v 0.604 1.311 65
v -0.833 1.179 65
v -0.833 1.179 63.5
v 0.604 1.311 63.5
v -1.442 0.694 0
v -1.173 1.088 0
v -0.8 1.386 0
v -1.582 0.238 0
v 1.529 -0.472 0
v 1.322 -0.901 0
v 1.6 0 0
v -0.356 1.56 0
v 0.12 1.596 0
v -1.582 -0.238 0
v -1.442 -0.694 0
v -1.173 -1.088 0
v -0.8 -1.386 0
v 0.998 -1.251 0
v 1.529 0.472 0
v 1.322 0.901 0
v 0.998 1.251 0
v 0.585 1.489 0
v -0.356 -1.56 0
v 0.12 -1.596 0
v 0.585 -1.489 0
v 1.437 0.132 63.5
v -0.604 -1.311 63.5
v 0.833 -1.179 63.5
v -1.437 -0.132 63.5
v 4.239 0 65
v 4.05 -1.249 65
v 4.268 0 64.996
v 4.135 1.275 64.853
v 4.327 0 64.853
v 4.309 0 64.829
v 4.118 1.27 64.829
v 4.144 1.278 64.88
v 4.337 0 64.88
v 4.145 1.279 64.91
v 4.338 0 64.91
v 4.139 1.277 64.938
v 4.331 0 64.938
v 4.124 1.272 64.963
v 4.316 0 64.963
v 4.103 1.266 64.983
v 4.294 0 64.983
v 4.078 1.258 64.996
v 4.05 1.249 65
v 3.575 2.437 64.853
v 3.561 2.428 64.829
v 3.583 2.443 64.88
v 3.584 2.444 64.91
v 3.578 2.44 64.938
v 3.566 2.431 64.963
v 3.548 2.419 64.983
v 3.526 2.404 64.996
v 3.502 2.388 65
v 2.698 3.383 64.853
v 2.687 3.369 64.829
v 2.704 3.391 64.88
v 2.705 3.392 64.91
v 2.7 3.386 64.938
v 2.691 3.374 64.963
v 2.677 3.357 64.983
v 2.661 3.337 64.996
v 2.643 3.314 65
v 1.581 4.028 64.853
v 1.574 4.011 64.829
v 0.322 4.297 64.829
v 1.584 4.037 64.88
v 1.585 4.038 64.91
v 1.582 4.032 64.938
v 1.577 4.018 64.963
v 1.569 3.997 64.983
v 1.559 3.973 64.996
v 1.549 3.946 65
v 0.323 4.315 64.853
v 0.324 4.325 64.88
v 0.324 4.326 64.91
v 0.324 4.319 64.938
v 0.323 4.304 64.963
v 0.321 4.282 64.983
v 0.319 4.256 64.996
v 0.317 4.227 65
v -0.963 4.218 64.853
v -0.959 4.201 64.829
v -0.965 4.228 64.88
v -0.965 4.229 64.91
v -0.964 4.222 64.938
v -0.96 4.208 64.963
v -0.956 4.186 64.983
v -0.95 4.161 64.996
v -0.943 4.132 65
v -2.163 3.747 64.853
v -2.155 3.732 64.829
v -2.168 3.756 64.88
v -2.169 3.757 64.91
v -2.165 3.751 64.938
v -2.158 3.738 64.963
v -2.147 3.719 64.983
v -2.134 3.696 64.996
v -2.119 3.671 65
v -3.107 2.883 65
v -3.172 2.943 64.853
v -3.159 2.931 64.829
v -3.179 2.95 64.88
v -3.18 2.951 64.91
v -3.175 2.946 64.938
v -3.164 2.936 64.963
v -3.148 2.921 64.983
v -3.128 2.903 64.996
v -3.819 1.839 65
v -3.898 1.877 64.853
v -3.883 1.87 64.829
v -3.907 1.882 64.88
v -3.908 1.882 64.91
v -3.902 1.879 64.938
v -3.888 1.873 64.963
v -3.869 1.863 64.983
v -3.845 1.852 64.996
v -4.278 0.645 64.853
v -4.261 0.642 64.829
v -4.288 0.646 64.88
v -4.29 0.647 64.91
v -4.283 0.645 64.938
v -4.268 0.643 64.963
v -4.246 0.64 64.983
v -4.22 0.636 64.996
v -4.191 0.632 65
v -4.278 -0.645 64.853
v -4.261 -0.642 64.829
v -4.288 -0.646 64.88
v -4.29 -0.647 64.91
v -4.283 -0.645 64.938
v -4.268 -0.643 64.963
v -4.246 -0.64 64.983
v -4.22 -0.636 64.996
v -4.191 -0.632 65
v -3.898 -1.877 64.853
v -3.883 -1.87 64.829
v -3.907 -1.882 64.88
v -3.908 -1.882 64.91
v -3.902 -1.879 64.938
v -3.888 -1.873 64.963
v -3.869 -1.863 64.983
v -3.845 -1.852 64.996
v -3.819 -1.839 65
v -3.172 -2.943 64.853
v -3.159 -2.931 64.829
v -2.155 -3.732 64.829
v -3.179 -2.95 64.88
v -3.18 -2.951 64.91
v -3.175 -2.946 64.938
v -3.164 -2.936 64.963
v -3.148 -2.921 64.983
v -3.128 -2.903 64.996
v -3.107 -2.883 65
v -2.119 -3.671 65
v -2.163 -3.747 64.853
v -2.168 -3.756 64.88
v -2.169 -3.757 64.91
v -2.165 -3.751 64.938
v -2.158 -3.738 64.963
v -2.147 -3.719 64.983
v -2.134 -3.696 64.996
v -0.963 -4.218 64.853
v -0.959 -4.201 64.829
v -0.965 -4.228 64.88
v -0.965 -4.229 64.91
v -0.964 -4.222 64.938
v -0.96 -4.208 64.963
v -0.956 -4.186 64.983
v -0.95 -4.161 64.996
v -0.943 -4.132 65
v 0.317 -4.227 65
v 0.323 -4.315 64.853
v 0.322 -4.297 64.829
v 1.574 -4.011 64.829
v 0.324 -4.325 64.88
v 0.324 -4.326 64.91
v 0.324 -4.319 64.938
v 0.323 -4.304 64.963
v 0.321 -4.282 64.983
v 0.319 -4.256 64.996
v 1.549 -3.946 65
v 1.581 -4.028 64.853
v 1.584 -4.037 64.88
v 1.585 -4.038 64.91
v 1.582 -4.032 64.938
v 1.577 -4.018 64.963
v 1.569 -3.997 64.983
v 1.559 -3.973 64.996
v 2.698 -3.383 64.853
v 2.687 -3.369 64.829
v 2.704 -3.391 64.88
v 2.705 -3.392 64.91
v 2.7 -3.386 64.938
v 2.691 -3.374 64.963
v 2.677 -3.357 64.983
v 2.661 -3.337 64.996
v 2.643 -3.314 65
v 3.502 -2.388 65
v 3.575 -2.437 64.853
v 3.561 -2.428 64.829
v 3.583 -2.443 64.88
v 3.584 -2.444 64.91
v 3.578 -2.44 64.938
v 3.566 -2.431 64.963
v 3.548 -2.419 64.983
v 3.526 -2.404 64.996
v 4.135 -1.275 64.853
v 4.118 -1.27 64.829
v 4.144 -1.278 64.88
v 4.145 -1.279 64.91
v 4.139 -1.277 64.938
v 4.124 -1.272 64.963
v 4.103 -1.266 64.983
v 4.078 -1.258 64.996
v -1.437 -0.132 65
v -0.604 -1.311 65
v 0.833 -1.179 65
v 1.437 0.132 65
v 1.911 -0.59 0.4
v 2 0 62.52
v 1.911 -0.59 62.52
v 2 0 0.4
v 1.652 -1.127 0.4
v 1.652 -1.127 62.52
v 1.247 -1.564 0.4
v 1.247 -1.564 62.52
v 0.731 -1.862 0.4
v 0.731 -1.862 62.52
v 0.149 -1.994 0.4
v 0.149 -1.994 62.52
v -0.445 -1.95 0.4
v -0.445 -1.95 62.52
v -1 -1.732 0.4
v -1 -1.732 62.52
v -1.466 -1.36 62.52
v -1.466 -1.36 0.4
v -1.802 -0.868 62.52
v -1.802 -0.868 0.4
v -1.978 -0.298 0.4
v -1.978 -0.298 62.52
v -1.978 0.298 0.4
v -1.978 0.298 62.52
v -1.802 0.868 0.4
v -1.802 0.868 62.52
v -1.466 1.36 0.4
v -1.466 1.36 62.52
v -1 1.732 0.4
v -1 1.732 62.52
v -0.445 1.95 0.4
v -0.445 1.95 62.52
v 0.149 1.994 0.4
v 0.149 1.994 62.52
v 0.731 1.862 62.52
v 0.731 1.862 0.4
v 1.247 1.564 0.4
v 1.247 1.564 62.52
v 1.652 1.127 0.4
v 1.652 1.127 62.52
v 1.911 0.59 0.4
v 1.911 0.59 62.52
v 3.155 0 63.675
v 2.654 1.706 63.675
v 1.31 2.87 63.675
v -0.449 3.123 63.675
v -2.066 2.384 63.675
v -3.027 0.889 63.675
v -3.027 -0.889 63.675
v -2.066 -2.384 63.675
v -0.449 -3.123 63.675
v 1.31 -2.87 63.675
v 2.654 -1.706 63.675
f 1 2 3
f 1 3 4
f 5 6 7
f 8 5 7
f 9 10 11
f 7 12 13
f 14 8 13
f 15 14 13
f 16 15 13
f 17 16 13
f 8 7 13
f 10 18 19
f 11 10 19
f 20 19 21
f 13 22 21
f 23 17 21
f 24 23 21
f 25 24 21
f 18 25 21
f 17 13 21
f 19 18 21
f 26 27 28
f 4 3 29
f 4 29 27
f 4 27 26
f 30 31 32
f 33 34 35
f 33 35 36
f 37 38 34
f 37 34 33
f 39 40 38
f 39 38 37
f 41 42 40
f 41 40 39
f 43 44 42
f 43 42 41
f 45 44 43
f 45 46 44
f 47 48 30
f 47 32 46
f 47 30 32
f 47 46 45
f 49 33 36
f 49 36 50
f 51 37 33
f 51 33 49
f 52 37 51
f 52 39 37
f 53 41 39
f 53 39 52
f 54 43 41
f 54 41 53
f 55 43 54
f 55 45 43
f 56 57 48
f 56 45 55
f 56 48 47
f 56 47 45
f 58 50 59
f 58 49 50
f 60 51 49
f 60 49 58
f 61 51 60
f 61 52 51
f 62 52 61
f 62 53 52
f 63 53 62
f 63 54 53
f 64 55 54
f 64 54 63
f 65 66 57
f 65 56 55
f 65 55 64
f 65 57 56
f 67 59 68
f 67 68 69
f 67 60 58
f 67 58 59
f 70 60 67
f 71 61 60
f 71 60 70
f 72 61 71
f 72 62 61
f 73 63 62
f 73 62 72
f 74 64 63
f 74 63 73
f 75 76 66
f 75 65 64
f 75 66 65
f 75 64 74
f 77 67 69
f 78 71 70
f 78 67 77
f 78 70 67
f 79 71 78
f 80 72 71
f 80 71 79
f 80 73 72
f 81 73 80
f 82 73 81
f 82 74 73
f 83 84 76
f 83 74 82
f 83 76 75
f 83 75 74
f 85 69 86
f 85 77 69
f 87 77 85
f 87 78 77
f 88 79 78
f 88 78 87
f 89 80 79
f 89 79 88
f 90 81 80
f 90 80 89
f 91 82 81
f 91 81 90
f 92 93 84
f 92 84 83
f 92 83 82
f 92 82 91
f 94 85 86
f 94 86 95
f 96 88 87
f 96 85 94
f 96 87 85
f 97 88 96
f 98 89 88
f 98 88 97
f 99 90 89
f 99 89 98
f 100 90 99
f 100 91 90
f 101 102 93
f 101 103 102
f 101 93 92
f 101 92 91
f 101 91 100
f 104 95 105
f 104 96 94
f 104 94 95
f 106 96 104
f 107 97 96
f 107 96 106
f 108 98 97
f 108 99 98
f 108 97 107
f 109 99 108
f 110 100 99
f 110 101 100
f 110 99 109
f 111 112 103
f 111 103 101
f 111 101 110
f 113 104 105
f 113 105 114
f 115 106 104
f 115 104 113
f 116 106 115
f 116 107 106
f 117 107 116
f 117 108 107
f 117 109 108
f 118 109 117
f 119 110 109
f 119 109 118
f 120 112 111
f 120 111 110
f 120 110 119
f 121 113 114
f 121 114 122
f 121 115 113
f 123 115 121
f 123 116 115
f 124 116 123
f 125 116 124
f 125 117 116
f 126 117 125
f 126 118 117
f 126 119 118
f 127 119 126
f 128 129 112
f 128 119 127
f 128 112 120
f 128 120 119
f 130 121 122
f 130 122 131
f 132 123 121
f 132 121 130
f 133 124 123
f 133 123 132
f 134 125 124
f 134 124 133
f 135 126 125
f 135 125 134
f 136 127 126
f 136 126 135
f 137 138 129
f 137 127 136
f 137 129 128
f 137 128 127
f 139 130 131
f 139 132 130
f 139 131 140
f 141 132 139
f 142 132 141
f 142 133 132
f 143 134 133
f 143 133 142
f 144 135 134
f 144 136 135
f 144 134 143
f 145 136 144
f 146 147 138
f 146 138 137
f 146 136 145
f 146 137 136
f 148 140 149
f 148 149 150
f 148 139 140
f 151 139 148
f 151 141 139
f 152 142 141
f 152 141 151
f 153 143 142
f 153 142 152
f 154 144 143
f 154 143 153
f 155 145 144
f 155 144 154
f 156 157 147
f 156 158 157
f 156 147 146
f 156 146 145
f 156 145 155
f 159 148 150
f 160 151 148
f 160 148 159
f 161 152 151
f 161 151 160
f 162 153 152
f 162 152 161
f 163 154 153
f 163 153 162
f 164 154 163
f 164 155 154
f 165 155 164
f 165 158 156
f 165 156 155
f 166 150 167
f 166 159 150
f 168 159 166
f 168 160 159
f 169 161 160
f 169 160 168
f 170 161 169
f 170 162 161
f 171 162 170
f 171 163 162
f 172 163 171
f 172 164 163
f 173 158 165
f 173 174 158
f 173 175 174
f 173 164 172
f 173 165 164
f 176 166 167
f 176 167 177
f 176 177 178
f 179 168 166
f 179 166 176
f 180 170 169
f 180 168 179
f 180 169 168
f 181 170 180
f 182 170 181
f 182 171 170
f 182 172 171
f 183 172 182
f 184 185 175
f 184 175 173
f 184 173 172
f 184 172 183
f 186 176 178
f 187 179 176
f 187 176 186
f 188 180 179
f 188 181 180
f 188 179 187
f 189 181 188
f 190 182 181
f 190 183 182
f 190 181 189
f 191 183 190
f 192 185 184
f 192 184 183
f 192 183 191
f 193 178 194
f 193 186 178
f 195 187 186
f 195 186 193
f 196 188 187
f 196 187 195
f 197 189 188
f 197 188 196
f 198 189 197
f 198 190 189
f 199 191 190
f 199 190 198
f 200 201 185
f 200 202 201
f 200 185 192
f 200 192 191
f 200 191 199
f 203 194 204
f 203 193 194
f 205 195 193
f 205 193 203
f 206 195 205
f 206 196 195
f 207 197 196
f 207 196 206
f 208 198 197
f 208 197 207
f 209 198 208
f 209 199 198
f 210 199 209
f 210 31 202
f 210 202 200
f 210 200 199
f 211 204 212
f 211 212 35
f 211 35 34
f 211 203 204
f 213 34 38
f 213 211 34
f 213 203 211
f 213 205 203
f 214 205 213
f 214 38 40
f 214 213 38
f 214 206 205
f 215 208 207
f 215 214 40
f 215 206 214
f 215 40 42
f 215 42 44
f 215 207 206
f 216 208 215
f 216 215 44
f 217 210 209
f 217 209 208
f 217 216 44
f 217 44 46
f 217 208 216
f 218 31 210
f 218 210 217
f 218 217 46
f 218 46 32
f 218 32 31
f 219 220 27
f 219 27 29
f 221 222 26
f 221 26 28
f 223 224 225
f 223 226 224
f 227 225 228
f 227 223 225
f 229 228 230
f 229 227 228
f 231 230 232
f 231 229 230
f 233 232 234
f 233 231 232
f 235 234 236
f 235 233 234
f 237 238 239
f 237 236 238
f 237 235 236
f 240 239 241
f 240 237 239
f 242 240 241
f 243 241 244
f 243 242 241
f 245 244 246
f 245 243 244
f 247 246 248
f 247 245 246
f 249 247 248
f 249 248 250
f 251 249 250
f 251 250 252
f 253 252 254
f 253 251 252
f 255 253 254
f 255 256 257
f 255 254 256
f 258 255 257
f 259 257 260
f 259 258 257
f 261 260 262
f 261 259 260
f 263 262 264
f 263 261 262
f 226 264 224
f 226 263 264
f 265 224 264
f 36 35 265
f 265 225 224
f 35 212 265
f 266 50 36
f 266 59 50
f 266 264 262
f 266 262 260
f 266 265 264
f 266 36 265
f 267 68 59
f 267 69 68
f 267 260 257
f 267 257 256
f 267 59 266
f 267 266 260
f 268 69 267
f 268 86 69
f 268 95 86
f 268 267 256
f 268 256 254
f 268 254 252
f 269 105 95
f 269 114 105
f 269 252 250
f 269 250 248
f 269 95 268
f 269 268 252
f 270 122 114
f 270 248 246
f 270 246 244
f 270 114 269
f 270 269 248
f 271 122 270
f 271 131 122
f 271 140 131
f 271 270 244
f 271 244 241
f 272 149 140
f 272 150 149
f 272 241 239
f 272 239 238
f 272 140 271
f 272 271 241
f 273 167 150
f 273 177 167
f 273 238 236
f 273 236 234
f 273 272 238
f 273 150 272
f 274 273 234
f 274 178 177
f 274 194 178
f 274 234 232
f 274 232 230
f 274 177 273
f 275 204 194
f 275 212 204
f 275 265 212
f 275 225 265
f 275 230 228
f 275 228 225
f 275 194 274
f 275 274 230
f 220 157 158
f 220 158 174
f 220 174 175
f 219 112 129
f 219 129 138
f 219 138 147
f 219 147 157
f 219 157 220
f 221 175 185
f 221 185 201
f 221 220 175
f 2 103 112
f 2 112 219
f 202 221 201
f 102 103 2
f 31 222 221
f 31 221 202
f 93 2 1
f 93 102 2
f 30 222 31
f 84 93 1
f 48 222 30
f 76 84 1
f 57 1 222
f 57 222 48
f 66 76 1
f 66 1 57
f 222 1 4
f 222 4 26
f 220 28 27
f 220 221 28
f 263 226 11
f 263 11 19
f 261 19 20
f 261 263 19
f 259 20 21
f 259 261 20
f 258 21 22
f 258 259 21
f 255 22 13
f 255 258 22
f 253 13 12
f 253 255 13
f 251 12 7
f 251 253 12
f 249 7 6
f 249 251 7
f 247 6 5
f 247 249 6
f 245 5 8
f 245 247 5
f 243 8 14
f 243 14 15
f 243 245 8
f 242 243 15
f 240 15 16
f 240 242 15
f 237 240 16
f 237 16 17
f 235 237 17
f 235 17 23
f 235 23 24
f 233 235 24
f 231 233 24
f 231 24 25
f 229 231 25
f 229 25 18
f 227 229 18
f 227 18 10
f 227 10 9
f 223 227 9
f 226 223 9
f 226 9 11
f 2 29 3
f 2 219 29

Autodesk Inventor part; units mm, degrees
ref_plane "YZ Plane" through (0, 0, 0) normal (1, 0, 0) x (0, 1, 0)
ref_plane "XZ Plane" through (0, 0, 0) normal (0, 1, 0) x (-1, 0, 0)
ref_plane "XY Plane" through (0, 0, 0) normal (0, 0, 1) x (1, 0, 0)
sketch "Sketch1" plane through (0, 0, 0) normal (0, 0, 1) x (1, 0, 0)
  circle A0 centre (0, 0) radius 2
  dimension "Diameter" = 4
extrude "Extrusion1" add sketch "Sketch1" along normal blind 62.52
sketch "Sketch2" plane through (0, 0, 62.52) normal (0, 0, 1) x (1, 0, 0)
  circle A0 centre (0, 0) radius 2 projected
extrude "Extrusion2" add sketch "Sketch2" along normal blind 2.48 draft 45
sketch "Sketch3" plane through (0, 0, 65) normal (0, 0, 1) x (1, 0, 0)
  circle A0 centre (0, 0) radius 4.48 projected
  circle A1 centre (0, 0) radius 1.4434 construction
  line L0 (0.6042, 1.3108) -> (1.4373, 0.1322)
  line L1 (1.4373, 0.1322) -> (0.8331, -1.1787)
  line L2 (0.8331, -1.1787) -> (-0.6042, -1.3108)
  line L3 (-0.6042, -1.3108) -> (-1.4373, -0.1322)
  line L4 (-1.4373, -0.1322) -> (-0.8331, 1.1787)
  line L5 (-0.8331, 1.1787) -> (0.6042, 1.3108)
  dimension "Hex_Width" = 2.5
extrude "Extrusion3" cut sketch "Sketch3" against normal blind 1.5 contours L0 L1 L2 L3 L4 L5
chamfer "Chamfer2" distance 0.4 angle 45 1 edges at (-2, 0, 0)
fillet "Fillet1" radius 0.1 1 edges at (-4.48, 0, 65)
thread "Thread2" size "M4x0.7" class "6g" standard "ANSI Metric M Profile" length 30
equation "\"d13\" = Chamfer"
equation "\"Thread_Length\" = 7.52"
equation "\"Chamfer\" = 0.4"
properties part number "SCREW, FLAT HD, P, 12_9, M4X0_7X65MM" material "Steel"
